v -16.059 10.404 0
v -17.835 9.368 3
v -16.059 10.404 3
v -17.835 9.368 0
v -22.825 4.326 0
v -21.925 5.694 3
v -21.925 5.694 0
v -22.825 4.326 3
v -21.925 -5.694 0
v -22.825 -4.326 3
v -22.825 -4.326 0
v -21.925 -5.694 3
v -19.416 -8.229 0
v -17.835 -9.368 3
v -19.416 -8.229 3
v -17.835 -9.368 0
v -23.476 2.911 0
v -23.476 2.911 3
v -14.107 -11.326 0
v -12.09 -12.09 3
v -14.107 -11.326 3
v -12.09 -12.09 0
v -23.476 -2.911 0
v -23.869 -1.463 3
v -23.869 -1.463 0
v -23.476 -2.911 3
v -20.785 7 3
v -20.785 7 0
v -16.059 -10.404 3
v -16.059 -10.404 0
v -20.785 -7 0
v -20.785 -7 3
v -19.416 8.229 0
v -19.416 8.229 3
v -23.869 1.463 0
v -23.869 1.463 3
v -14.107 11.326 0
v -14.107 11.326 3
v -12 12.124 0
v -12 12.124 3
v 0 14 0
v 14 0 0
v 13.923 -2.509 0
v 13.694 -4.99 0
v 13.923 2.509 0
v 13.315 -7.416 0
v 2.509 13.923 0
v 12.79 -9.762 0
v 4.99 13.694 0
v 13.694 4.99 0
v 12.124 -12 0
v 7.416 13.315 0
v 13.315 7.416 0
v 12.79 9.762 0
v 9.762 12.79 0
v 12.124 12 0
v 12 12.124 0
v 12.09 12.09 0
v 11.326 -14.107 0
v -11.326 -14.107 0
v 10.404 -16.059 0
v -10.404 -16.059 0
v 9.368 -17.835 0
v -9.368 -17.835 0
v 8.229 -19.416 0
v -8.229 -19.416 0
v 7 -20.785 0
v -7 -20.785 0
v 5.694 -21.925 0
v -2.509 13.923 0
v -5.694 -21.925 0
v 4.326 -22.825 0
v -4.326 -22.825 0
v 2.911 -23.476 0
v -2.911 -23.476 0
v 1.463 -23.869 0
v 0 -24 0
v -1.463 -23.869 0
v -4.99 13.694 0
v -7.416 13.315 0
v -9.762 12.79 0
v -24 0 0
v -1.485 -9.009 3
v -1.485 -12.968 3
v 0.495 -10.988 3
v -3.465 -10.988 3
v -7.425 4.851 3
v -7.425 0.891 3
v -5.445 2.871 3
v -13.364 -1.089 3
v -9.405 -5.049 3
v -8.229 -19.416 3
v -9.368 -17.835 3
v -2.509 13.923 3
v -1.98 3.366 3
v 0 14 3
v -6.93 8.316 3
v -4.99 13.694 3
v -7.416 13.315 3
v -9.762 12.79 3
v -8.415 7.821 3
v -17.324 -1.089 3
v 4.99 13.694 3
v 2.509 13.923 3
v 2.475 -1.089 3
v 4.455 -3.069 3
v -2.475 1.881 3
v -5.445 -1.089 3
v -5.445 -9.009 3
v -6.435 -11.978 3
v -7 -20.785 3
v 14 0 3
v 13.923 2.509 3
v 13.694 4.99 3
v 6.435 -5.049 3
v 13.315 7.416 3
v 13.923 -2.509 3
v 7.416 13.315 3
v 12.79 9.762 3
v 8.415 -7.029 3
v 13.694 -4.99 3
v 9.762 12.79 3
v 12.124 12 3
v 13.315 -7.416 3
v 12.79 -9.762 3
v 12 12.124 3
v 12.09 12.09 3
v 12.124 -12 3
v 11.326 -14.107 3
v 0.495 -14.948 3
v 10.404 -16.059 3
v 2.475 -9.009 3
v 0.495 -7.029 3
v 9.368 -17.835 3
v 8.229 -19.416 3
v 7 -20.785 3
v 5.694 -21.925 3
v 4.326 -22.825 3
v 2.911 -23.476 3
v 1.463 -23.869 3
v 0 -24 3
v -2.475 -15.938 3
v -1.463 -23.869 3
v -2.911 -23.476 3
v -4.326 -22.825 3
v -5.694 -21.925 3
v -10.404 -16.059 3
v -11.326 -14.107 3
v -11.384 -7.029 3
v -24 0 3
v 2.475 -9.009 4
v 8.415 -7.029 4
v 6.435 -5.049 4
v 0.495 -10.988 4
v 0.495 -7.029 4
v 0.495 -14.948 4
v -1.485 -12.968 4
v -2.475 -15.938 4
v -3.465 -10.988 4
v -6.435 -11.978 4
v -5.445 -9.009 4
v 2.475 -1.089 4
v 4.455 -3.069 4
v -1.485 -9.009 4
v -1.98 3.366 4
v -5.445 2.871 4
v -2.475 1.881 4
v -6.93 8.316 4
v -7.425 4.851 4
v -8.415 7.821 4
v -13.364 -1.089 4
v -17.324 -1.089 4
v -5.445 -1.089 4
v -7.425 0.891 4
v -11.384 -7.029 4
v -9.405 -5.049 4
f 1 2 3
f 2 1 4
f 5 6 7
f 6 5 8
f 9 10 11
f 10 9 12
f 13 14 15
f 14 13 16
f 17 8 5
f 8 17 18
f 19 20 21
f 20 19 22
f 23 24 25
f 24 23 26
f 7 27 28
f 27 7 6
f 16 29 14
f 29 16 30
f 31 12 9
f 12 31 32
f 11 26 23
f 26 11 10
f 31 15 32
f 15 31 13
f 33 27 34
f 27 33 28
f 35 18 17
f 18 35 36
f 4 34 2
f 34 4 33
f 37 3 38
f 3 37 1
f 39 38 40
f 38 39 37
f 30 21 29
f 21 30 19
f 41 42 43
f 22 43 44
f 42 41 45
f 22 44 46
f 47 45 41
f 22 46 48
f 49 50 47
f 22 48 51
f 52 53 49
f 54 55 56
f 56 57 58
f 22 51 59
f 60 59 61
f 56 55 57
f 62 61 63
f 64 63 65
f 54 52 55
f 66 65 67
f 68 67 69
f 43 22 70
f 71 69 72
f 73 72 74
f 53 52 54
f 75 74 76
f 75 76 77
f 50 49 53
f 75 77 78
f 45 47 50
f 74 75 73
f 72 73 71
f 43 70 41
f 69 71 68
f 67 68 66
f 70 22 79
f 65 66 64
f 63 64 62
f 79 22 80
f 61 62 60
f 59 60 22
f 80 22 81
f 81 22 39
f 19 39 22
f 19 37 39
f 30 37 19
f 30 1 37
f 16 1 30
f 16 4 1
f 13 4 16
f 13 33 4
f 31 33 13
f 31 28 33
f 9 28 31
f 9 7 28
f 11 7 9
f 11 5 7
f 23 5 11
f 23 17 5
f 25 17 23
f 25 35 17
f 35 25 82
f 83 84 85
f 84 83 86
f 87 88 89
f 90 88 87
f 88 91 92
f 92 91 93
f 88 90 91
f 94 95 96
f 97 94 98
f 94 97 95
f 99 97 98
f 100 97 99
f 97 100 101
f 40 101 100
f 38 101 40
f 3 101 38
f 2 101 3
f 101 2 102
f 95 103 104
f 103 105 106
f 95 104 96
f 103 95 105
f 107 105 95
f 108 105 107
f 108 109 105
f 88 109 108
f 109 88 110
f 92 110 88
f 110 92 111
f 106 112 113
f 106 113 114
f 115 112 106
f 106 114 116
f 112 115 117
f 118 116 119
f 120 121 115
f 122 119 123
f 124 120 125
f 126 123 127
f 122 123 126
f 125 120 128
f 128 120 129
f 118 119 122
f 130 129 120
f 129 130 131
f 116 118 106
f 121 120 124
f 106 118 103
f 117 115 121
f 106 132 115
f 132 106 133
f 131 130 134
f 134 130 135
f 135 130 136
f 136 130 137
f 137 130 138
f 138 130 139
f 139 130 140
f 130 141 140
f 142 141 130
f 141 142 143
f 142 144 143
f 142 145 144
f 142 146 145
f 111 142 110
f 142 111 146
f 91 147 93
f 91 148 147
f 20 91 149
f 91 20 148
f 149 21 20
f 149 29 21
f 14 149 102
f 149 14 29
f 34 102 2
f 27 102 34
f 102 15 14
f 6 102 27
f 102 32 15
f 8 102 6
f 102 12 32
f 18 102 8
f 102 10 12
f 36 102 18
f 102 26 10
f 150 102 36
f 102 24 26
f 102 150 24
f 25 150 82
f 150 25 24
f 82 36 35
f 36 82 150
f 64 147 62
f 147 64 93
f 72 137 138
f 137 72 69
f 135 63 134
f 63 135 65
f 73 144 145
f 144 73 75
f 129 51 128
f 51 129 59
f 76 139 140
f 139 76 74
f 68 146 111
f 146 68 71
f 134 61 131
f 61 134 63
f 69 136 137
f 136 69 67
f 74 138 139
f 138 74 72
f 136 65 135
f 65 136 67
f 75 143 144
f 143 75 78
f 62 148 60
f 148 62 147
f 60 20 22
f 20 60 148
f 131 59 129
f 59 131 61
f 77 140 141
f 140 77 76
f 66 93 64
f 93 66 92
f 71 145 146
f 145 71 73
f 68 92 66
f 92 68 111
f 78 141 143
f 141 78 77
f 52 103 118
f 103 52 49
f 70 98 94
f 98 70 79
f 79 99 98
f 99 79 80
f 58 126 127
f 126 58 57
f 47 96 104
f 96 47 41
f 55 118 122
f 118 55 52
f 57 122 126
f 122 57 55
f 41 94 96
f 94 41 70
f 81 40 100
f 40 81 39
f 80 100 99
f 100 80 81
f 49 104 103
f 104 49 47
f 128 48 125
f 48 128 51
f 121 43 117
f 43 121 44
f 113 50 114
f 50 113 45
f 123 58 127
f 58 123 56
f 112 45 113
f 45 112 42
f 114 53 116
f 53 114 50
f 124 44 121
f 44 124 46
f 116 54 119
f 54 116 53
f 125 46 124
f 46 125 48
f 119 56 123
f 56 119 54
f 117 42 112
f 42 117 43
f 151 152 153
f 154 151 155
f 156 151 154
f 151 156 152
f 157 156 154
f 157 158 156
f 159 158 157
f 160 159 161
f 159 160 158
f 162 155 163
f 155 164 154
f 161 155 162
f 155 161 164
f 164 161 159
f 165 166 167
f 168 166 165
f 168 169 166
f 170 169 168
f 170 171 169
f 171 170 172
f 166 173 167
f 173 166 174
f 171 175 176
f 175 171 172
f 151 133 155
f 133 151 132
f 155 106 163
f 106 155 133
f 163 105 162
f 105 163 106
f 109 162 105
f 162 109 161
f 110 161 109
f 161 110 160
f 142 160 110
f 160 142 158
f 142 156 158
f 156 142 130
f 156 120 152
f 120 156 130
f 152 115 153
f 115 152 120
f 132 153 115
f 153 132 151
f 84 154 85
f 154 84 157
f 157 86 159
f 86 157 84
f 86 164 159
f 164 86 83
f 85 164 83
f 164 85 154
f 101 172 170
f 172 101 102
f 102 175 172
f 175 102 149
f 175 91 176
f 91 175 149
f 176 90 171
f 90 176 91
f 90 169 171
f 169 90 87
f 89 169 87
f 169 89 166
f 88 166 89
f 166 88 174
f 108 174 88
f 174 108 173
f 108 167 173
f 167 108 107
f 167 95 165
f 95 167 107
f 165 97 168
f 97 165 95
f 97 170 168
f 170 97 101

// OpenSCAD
// Initialed Heart Ornament
// By Jake Poznanski
// preview[view:north east, tilt:top]

//Enter your two letter initials
initials = "AJ"; 

//The height of the main heart body in mm
height = 3; // [3:10]

//The height of the letters themselves
letter_height = 1; // [1:5]

//Internal variables
heartAngle = 90*1;
size = 14*1;
ratio = 48/28;
elipseSize = [size * ratio,size,height];

//Importing this module directly for Makerbot customizer script
// Spiff Sans
// Author: Stuart P. Bentley <stuart@testtrack4.com>

module spiffsans_puts(letters, count, offsets)
{
  for(i=[0:count-1])
  {
    translate([offsets[i],0,0])
    {
      spiffsans_lookup_draw(letters[i]);
    }
  }
}

module spiffsans_lookup_draw(char)
{
  if(char==" ") {} //silly lookup, space can't be printed
  else if(char =="!") spiffsans_exclaim();
  else if(char =="-") spiffsans_hyphen();
  else if(char ==".") spiffsans_period();
  else if(char =="0") spiffsans_digit_0();
  else if(char =="1") spiffsans_digit_1();
  else if(char =="2") spiffsans_digit_2();
  else if(char =="3") spiffsans_digit_3();
  else if(char =="4") spiffsans_digit_4();
  else if(char =="5") spiffsans_digit_5();
  else if(char =="6") spiffsans_digit_6();
  else if(char =="7") spiffsans_digit_7();
  else if(char =="8") spiffsans_digit_8();
  else if(char =="9") spiffsans_digit_9();
  else if(char ==":") spiffsans_colon();
  else if(char =="?") spiffsans_question();
  else if(char =="A" || char == "a") spiffsans_capital_a();
  else if(char =="B" || char == "b") spiffsans_capital_b();
  else if(char =="C" || char == "c") spiffsans_capital_c();
  else if(char =="D" || char == "d") spiffsans_capital_d();
  else if(char =="E" || char == "e") spiffsans_capital_e();
  else if(char =="F" || char == "f") spiffsans_capital_f();
  else if(char =="G" || char == "g") spiffsans_capital_g();
  else if(char =="H" || char == "h") spiffsans_capital_h();
  else if(char =="I" || char == "i") spiffsans_capital_i();
  else if(char =="J" || char == "j") spiffsans_capital_j();
  else if(char =="K" || char == "k") spiffsans_capital_k();
  else if(char =="L" || char == "l") spiffsans_capital_l();
  else if(char =="M" || char == "m") spiffsans_capital_m();
  else if(char =="N" || char == "n") spiffsans_capital_n();
  else if(char =="O" || char == "o") spiffsans_capital_o();
  else if(char =="P" || char == "p") spiffsans_capital_p();
  else if(char =="Q" || char == "q") spiffsans_capital_q();
  else if(char =="R" || char == "r") spiffsans_capital_r();
  else if(char =="S" || char == "s") spiffsans_capital_s();
  else if(char =="T" || char == "t") spiffsans_capital_t();
  else if(char =="U" || char == "u") spiffsans_capital_u();
  else if(char =="V" || char == "v") spiffsans_capital_v();
  else if(char =="W" || char == "w") spiffsans_capital_w();
  else if(char =="X" || char == "x") spiffsans_capital_x();
  else if(char =="Y" || char == "y") spiffsans_capital_y();
  else if(char =="Z" || char == "z") spiffsans_capital_z();
  else echo(str("Unknown character: ", char));
}

module spiffsans_exclaim()
{
  polygon(points=[[0,3],[0,10],[2,10],[2,3],[0,0],[0,2],[2,2],[2,0]],paths=[[0,1,2,3],[4,5,6,7]]);
}

module spiffsans_hyphen()
{
  polygon(points=[[0,4],[0,6],[4,6],[4,4]],paths=[[0,1,2,3]]);
}

module spiffsans_period()
{
  polygon(points=[[0,0],[0,2],[2,2],[2,0]],paths=[[0,1,2,3]]);
}

module spiffsans_digit_0()
{
  polygon(points=[[5,0],[1,0],[0,2],[0,8],[1,10],[5,10],[6,8],[6,2],[2,8],[4,8],[2,5],[2,2],[4,5],[4,2]],paths=[[0,1,2,3,4,5,6,7],[8,9,10],[11,12,13]]);
}

module spiffsans_digit_1()
{
  polygon(points=[[0,0],[0,2],[2,2],[2,7],[0,7],[2,10],[4,10],[4,2],[5,2],[5,0]],paths=[[0,1,2,3,4,5,6,7,8,9]]);
}

module spiffsans_digit_2()
{
  polygon(points=[[0,0],[0,2],[4,6],[4,8],[2,8],[2,6],[0,6],[0,8],[1,10],[5,10],[6,8],[6,5.5],[2.5,2],[6,2],[6,0]],paths=[[0,1,2,3,4,5,6,7,8,9,10,11,12,13,14]]);
}

module spiffsans_digit_3()
{
  polygon(points=[[1,0],[0,2],[0,4],[2,4],[2,2],[4,2],[4,4],[3,4],[3,6],[4,6],[4,8],[2,8],[2,6],[0,6],[0,8],[1,10],[5,10],[6,8],[6,6],[5.5,5],[6,4],[6,2],[5,0]],paths=[[0,1,2,3,4,5,6,7,8,9,10,11,12,13,14,15,16,17,18,19,20,21,22]]);
}

module spiffsans_digit_4()
{
  polygon(points=[[4,0],[4,4],[0,4],[0,10],[2,10],[2,6],[4,6],[4,10],[6,10],[6,0]],paths=[[0,1,2,3,4,5,6,7,8,9]]);
}

module spiffsans_digit_5()
{
  polygon(points=[[0,0],[0,2],[4,2],[4.5,3],[4,4],[0,4],[0,10],[6,10],[6,8],[2,8],[2,6],[5,6],[6,4],[6,2],[5,0]],paths=[[0,1,2,3,4,5,6,7,8,9,10,11,12,13,14]]);
}

module spiffsans_digit_6()
{
  polygon(points=[[1,0],[0,2],[0,8],[1,10],[5,10],[5.5,8],[2,8],[2,6],[5,6],[6,4],[6,2],[5,0],[2,2],[2,4],[4,4],[4,2]],paths=[[0,1,2,3,4,5,6,7,8,9,10,11],[12,13,14,15]]);
}

module spiffsans_digit_7()
{
  polygon(points=[[1,0],[1,3],[3,8],[0,8],[0,10],[5,10],[5,8],[3,3],[3,0]],paths=[[0,1,2,3,4,5,6,7,8]]);
}

module spiffsans_digit_8()
{
  polygon(points=[[1,0],[0,2],[0,4],[0.5,5],[0,6],[0,8],[1,10],[5,10],[6,8],[6,6],[5.5,5],[6,4],[6,2],[5,0],[2,6],[2,8],[4,8],[4,6],[2,2],[2,4],[4,4],[4,2]],paths=[[0,1,2,3,4,5,6,7,8,9,10,11,12,13],[14,15,16,17],[18,19,20,21]]);
}

module spiffsans_digit_9()
{
  polygon(points=[[1,0],[0,2],[4,2],[4,4],[1,4],[0,6],[0,8],[1,10],[5,10],[6,8],[6,2],[5,0],[2,6],[2,8],[4,8],[4,6]],paths=[[0,1,2,3,4,5,6,7,8,9,10,11],[12,13,14,15]]);
}

module spiffsans_colon()
{
  polygon(points=[[0,6],[0,8],[2,8],[2,6],[0,2],[0,4],[2,4],[2,2]],paths=[[0,1,2,3],[4,5,6,7]]);
}

module spiffsans_question()
{
  polygon(points=[[2,3],[4,6],[4,8],[2,8],[2,6],[0,6],[0,8],[2,10],[4,10],[6,8],[6,6],[4,3],[2,0],[2,2],[4,2],[4,0]],paths=[[0,1,2,3,4,5,6,7,8,9,10,11],[12,13,14,15]]);
}

module spiffsans_capital_a()
{
  polygon(points=[[0,0],[0,8],[1,10],[5,10],[6,8],[6,0],[4,0],[4,4],[2,4],[2,0],[2,6],[2,8],[4,8],[4,6]],paths=[[0,1,2,3,4,5,6,7,8,9],[10,11,12,13]]);
}

module spiffsans_capital_b()
{
  polygon(points=[[0,0],[0,10],[5,10],[6,8],[6,6],[5.5,5],[6,4],[6,2],[5,0],[2,6],[2,8],[4,8],[4,6],[2,2],[2,4],[4,4],[4,2]],paths=[[0,1,2,3,4,5,6,7,8],[9,10,11,12],[13,14,15,16]]);
}

module spiffsans_capital_c()
{
  polygon(points=[[6,0],[1,0],[0,2],[0,8],[1,10],[6,10],[6,8],[2,8],[2,2],[6,2]],paths=[[0,1,2,3,4,5,6,7,8,9]]);
}

module spiffsans_capital_d()
{
  polygon(points=[[0,0],[0,10],[5,10],[6,8],[6,2],[5,0],[2,2],[2,8],[4,8],[4,2]],paths=[[0,1,2,3,4,5],[6,7,8,9]]);
}

module spiffsans_capital_e()
{
  polygon(points=[[0,0],[0,10],[5,10],[5,8],[2,8],[2,6],[4,6],[4,4],[2,4],[2,2],[5,2],[5,0]],paths=[[0,1,2,3,4,5,6,7,8,9,10,11]]);
}

module spiffsans_capital_f()
{
  polygon(points=[[0,0],[0,10],[5,10],[5,8],[2,8],[2,6],[4,6],[4,4],[2,4],[2,0]],paths=[[0,1,2,3,4,5,6,7,8,9]]);
}

module spiffsans_capital_g()
{
  polygon(points=[[6,0],[1,0],[0,2],[0,8],[1,10],[5.5,10],[6,8],[2,8],[2,2],[4,2],[4,6],[6,6]],paths=[[0,1,2,3,4,5,6,7,8,9,10,11]]);
}

module spiffsans_capital_h()
{
  polygon(points=[[0,0],[0,10],[2,10],[2,6],[4,6],[4,10],[6,10],[6,0],[4,0],[4,4],[2,4],[2,0]],paths=[[0,1,2,3,4,5,6,7,8,9,10,11]]);
}

module spiffsans_capital_i()
{
  polygon(points=[[0,0],[0,2],[1.5,2],[1.5,8],[0,8],[0,10],[5,10],[5,8],[3.5,8],[3.5,2],[5,2],[5,0]],paths=[[0,1,2,3,4,5,6,7,8,9,10,11]]);
}

module spiffsans_capital_j()
{
  polygon(points=[[0.5,0],[0,1],[0,4],[2,4],[2,2],[4,2],[4,8],[0,8],[0,10],[6,10],[6,1],[5.5,0]],paths=[[0,1,2,3,4,5,6,7,8,9,10,11]]);
}

module spiffsans_capital_k()
{
  polygon(points=[[0,0],[0,10],[2,10],[2,6],[4,6],[4,10],[6,10],[6,6],[5,5],[6,4],[6,0],[4,0],[4,4],[2,4],[2,0]],paths=[[0,1,2,3,4,5,6,7,8,9,10,11,12,13,14]]);
}

module spiffsans_capital_l()
{
  polygon(points=[[0,0],[0,10],[2,10],[2,2],[5,2],[5,0]],paths=[[0,1,2,3,4,5]]);
}

module spiffsans_capital_m()
{
  polygon(points=[[0,0],[0,8],[1,10],[9,10],[10,8],[10,0],[8,0],[8,8],[6,8],[6,0],[4,0],[4,8],[2,8],[2,0]],paths=[[0,1,2,3,4,5,6,7,8,9,10,11,12,13]]);
}

module spiffsans_capital_n()
{
  polygon(points=[[0,0],[0,8],[1,10],[5,10],[6,8],[6,0],[4,0],[4,8],[2,8],[2,0]],paths=[[0,1,2,3,4,5,6,7,8,9]]);
}

module spiffsans_capital_o()
{
  polygon(points=[[5,0],[1,0],[0,2],[0,8],[1,10],[5,10],[6,8],[6,2],[2,2],[2,8],[4,8],[4,2]],paths=[[0,1,2,3,4,5,6,7],[8,9,10,11]]);
}

module spiffsans_capital_p()
{
  polygon(points=[[0,0],[0,10],[5,10],[6,8],[6,6],[5,4],[2,4],[2,0],[2,6],[2,8],[4,8],[4,6]],paths=[[0,1,2,3,4,5,6,7],[8,9,10,11]]);
}

module spiffsans_capital_q()
{
  polygon(points=[[1,0],[0,2],[0,8],[1,10],[5,10],[6,8],[6,0],[2,2],[2,8],[4,8],[4,2]],paths=[[0,1,2,3,4,5,6],[7,8,9,10]]);
}

module spiffsans_capital_r()
{
  polygon(points=[[0,0],[0,10],[5,10],[6,8],[6,6],[5.5,5],[6,4],[6,0],[4,0],[4,4],[2,4],[2,0],[2,6],[2,8],[4,8],[4,6]],paths=[[0,1,2,3,4,5,6,7,8,9,10,11],[12,13,14,15]]);
}

module spiffsans_capital_s()
{
  polygon(points=[[1,0],[0,2],[0,3],[2,3],[2,2],[4,2],[4,4],[1,4],[0,5],[0,8],[1,10],[5,10],[6,8],[6,7],[4,7],[4,8],[2,8],[2,6],[5,6],[6,5],[6,2],[5,0]],paths=[[0,1,2,3,4,5,6,7,8,9,10,11,12,13,14,15,16,17,18,19,20,21]]);
}

module spiffsans_capital_t()
{
  polygon(points=[[2,0],[2,8],[0,8],[0,10],[6,10],[6,8],[4,8],[4,0]],paths=[[0,1,2,3,4,5,6,7]]);
}

module spiffsans_capital_u()
{
  polygon(points=[[1,0],[0,2],[0,10],[2,10],[2,2],[4,2],[4,10],[6,10],[6,2],[5,0]],paths=[[0,1,2,3,4,5,6,7,8,9]]);
}

module spiffsans_capital_v()
{
  polygon(points=[[2,0],[0,4],[0,10],[2,10],[2,4],[4,4],[4,10],[6,10],[6,4],[4,0]],paths=[[0,1,2,3,4,5,6,7,8,9]]);
}

module spiffsans_capital_w()
{
  polygon(points=[[9,0],[1,0],[0,2],[0,10],[2,10],[2,2],[4,2],[4,10],[6,10],[6,2],[8,2],[8,10],[10,10],[10,2]],paths=[[0,1,2,3,4,5,6,7,8,9,10,11,12,13]]);
}

module spiffsans_capital_x()
{
  polygon(points=[[0,0],[0,4],[1,5],[0,6],[0,10],[2,10],[2,6],[4,6],[4,10],[6,10],[6,6],[5,5],[6,4],[6,0],[4,0],[4,4],[2,4],[2,0]],paths=[[0,1,2,3,4,5,6,7,8,9,10,11,12,13,14,15,16,17]]);
}

module spiffsans_capital_y()
{
  polygon(points=[[2,0],[2,4],[1,4],[0,6],[0,10],[2,10],[2,6],[4,6],[4,10],[6,10],[6,6],[5,4],[4,4],[4,0]],paths=[[0,1,2,3,4,5,6,7,8,9,10,11,12,13]]);
}

module spiffsans_capital_z()
{
  polygon(points=[[0,0],[0,2],[3,8],[0,8],[0,10],[5,10],[5,8],[2,2],[5,2],[5,0]],paths=[[0,1,2,3,4,5,6,7,8,9]]);
}


union()
{

translate([0,0,height])
scale([size/10,size/10,1])
linear_extrude(height=letter_height)
rotate(heartAngle+(90-heartAngle)/2+45)
translate([-2.0*(size/10)-5, -size/20,0])
spiffsans_puts(initials, 2, [0,10]);

union(){
intersection(){

union(){
scale(elipseSize)
cylinder(h = 1, r = 1,$fn=60);

rotate(heartAngle)
scale(elipseSize)
cylinder(h = 1, r = 1,$fn=60);
}

rotate(heartAngle+(90-heartAngle)/2+45)
translate([-elipseSize.x,0,-height/2])
cube(size = elipseSize*2);
}

intersection(){

intersection(){
scale(elipseSize)
cylinder(h = 1, r = 1,$fn=60);

rotate(heartAngle)
scale(elipseSize)
cylinder(h = 1, r = 1,$fn=60);
}

rotate(heartAngle+(90-heartAngle)/2+45)
translate([-elipseSize.x,-elipseSize.x,-height/2])
cube(size = elipseSize*2);
}
}


}
